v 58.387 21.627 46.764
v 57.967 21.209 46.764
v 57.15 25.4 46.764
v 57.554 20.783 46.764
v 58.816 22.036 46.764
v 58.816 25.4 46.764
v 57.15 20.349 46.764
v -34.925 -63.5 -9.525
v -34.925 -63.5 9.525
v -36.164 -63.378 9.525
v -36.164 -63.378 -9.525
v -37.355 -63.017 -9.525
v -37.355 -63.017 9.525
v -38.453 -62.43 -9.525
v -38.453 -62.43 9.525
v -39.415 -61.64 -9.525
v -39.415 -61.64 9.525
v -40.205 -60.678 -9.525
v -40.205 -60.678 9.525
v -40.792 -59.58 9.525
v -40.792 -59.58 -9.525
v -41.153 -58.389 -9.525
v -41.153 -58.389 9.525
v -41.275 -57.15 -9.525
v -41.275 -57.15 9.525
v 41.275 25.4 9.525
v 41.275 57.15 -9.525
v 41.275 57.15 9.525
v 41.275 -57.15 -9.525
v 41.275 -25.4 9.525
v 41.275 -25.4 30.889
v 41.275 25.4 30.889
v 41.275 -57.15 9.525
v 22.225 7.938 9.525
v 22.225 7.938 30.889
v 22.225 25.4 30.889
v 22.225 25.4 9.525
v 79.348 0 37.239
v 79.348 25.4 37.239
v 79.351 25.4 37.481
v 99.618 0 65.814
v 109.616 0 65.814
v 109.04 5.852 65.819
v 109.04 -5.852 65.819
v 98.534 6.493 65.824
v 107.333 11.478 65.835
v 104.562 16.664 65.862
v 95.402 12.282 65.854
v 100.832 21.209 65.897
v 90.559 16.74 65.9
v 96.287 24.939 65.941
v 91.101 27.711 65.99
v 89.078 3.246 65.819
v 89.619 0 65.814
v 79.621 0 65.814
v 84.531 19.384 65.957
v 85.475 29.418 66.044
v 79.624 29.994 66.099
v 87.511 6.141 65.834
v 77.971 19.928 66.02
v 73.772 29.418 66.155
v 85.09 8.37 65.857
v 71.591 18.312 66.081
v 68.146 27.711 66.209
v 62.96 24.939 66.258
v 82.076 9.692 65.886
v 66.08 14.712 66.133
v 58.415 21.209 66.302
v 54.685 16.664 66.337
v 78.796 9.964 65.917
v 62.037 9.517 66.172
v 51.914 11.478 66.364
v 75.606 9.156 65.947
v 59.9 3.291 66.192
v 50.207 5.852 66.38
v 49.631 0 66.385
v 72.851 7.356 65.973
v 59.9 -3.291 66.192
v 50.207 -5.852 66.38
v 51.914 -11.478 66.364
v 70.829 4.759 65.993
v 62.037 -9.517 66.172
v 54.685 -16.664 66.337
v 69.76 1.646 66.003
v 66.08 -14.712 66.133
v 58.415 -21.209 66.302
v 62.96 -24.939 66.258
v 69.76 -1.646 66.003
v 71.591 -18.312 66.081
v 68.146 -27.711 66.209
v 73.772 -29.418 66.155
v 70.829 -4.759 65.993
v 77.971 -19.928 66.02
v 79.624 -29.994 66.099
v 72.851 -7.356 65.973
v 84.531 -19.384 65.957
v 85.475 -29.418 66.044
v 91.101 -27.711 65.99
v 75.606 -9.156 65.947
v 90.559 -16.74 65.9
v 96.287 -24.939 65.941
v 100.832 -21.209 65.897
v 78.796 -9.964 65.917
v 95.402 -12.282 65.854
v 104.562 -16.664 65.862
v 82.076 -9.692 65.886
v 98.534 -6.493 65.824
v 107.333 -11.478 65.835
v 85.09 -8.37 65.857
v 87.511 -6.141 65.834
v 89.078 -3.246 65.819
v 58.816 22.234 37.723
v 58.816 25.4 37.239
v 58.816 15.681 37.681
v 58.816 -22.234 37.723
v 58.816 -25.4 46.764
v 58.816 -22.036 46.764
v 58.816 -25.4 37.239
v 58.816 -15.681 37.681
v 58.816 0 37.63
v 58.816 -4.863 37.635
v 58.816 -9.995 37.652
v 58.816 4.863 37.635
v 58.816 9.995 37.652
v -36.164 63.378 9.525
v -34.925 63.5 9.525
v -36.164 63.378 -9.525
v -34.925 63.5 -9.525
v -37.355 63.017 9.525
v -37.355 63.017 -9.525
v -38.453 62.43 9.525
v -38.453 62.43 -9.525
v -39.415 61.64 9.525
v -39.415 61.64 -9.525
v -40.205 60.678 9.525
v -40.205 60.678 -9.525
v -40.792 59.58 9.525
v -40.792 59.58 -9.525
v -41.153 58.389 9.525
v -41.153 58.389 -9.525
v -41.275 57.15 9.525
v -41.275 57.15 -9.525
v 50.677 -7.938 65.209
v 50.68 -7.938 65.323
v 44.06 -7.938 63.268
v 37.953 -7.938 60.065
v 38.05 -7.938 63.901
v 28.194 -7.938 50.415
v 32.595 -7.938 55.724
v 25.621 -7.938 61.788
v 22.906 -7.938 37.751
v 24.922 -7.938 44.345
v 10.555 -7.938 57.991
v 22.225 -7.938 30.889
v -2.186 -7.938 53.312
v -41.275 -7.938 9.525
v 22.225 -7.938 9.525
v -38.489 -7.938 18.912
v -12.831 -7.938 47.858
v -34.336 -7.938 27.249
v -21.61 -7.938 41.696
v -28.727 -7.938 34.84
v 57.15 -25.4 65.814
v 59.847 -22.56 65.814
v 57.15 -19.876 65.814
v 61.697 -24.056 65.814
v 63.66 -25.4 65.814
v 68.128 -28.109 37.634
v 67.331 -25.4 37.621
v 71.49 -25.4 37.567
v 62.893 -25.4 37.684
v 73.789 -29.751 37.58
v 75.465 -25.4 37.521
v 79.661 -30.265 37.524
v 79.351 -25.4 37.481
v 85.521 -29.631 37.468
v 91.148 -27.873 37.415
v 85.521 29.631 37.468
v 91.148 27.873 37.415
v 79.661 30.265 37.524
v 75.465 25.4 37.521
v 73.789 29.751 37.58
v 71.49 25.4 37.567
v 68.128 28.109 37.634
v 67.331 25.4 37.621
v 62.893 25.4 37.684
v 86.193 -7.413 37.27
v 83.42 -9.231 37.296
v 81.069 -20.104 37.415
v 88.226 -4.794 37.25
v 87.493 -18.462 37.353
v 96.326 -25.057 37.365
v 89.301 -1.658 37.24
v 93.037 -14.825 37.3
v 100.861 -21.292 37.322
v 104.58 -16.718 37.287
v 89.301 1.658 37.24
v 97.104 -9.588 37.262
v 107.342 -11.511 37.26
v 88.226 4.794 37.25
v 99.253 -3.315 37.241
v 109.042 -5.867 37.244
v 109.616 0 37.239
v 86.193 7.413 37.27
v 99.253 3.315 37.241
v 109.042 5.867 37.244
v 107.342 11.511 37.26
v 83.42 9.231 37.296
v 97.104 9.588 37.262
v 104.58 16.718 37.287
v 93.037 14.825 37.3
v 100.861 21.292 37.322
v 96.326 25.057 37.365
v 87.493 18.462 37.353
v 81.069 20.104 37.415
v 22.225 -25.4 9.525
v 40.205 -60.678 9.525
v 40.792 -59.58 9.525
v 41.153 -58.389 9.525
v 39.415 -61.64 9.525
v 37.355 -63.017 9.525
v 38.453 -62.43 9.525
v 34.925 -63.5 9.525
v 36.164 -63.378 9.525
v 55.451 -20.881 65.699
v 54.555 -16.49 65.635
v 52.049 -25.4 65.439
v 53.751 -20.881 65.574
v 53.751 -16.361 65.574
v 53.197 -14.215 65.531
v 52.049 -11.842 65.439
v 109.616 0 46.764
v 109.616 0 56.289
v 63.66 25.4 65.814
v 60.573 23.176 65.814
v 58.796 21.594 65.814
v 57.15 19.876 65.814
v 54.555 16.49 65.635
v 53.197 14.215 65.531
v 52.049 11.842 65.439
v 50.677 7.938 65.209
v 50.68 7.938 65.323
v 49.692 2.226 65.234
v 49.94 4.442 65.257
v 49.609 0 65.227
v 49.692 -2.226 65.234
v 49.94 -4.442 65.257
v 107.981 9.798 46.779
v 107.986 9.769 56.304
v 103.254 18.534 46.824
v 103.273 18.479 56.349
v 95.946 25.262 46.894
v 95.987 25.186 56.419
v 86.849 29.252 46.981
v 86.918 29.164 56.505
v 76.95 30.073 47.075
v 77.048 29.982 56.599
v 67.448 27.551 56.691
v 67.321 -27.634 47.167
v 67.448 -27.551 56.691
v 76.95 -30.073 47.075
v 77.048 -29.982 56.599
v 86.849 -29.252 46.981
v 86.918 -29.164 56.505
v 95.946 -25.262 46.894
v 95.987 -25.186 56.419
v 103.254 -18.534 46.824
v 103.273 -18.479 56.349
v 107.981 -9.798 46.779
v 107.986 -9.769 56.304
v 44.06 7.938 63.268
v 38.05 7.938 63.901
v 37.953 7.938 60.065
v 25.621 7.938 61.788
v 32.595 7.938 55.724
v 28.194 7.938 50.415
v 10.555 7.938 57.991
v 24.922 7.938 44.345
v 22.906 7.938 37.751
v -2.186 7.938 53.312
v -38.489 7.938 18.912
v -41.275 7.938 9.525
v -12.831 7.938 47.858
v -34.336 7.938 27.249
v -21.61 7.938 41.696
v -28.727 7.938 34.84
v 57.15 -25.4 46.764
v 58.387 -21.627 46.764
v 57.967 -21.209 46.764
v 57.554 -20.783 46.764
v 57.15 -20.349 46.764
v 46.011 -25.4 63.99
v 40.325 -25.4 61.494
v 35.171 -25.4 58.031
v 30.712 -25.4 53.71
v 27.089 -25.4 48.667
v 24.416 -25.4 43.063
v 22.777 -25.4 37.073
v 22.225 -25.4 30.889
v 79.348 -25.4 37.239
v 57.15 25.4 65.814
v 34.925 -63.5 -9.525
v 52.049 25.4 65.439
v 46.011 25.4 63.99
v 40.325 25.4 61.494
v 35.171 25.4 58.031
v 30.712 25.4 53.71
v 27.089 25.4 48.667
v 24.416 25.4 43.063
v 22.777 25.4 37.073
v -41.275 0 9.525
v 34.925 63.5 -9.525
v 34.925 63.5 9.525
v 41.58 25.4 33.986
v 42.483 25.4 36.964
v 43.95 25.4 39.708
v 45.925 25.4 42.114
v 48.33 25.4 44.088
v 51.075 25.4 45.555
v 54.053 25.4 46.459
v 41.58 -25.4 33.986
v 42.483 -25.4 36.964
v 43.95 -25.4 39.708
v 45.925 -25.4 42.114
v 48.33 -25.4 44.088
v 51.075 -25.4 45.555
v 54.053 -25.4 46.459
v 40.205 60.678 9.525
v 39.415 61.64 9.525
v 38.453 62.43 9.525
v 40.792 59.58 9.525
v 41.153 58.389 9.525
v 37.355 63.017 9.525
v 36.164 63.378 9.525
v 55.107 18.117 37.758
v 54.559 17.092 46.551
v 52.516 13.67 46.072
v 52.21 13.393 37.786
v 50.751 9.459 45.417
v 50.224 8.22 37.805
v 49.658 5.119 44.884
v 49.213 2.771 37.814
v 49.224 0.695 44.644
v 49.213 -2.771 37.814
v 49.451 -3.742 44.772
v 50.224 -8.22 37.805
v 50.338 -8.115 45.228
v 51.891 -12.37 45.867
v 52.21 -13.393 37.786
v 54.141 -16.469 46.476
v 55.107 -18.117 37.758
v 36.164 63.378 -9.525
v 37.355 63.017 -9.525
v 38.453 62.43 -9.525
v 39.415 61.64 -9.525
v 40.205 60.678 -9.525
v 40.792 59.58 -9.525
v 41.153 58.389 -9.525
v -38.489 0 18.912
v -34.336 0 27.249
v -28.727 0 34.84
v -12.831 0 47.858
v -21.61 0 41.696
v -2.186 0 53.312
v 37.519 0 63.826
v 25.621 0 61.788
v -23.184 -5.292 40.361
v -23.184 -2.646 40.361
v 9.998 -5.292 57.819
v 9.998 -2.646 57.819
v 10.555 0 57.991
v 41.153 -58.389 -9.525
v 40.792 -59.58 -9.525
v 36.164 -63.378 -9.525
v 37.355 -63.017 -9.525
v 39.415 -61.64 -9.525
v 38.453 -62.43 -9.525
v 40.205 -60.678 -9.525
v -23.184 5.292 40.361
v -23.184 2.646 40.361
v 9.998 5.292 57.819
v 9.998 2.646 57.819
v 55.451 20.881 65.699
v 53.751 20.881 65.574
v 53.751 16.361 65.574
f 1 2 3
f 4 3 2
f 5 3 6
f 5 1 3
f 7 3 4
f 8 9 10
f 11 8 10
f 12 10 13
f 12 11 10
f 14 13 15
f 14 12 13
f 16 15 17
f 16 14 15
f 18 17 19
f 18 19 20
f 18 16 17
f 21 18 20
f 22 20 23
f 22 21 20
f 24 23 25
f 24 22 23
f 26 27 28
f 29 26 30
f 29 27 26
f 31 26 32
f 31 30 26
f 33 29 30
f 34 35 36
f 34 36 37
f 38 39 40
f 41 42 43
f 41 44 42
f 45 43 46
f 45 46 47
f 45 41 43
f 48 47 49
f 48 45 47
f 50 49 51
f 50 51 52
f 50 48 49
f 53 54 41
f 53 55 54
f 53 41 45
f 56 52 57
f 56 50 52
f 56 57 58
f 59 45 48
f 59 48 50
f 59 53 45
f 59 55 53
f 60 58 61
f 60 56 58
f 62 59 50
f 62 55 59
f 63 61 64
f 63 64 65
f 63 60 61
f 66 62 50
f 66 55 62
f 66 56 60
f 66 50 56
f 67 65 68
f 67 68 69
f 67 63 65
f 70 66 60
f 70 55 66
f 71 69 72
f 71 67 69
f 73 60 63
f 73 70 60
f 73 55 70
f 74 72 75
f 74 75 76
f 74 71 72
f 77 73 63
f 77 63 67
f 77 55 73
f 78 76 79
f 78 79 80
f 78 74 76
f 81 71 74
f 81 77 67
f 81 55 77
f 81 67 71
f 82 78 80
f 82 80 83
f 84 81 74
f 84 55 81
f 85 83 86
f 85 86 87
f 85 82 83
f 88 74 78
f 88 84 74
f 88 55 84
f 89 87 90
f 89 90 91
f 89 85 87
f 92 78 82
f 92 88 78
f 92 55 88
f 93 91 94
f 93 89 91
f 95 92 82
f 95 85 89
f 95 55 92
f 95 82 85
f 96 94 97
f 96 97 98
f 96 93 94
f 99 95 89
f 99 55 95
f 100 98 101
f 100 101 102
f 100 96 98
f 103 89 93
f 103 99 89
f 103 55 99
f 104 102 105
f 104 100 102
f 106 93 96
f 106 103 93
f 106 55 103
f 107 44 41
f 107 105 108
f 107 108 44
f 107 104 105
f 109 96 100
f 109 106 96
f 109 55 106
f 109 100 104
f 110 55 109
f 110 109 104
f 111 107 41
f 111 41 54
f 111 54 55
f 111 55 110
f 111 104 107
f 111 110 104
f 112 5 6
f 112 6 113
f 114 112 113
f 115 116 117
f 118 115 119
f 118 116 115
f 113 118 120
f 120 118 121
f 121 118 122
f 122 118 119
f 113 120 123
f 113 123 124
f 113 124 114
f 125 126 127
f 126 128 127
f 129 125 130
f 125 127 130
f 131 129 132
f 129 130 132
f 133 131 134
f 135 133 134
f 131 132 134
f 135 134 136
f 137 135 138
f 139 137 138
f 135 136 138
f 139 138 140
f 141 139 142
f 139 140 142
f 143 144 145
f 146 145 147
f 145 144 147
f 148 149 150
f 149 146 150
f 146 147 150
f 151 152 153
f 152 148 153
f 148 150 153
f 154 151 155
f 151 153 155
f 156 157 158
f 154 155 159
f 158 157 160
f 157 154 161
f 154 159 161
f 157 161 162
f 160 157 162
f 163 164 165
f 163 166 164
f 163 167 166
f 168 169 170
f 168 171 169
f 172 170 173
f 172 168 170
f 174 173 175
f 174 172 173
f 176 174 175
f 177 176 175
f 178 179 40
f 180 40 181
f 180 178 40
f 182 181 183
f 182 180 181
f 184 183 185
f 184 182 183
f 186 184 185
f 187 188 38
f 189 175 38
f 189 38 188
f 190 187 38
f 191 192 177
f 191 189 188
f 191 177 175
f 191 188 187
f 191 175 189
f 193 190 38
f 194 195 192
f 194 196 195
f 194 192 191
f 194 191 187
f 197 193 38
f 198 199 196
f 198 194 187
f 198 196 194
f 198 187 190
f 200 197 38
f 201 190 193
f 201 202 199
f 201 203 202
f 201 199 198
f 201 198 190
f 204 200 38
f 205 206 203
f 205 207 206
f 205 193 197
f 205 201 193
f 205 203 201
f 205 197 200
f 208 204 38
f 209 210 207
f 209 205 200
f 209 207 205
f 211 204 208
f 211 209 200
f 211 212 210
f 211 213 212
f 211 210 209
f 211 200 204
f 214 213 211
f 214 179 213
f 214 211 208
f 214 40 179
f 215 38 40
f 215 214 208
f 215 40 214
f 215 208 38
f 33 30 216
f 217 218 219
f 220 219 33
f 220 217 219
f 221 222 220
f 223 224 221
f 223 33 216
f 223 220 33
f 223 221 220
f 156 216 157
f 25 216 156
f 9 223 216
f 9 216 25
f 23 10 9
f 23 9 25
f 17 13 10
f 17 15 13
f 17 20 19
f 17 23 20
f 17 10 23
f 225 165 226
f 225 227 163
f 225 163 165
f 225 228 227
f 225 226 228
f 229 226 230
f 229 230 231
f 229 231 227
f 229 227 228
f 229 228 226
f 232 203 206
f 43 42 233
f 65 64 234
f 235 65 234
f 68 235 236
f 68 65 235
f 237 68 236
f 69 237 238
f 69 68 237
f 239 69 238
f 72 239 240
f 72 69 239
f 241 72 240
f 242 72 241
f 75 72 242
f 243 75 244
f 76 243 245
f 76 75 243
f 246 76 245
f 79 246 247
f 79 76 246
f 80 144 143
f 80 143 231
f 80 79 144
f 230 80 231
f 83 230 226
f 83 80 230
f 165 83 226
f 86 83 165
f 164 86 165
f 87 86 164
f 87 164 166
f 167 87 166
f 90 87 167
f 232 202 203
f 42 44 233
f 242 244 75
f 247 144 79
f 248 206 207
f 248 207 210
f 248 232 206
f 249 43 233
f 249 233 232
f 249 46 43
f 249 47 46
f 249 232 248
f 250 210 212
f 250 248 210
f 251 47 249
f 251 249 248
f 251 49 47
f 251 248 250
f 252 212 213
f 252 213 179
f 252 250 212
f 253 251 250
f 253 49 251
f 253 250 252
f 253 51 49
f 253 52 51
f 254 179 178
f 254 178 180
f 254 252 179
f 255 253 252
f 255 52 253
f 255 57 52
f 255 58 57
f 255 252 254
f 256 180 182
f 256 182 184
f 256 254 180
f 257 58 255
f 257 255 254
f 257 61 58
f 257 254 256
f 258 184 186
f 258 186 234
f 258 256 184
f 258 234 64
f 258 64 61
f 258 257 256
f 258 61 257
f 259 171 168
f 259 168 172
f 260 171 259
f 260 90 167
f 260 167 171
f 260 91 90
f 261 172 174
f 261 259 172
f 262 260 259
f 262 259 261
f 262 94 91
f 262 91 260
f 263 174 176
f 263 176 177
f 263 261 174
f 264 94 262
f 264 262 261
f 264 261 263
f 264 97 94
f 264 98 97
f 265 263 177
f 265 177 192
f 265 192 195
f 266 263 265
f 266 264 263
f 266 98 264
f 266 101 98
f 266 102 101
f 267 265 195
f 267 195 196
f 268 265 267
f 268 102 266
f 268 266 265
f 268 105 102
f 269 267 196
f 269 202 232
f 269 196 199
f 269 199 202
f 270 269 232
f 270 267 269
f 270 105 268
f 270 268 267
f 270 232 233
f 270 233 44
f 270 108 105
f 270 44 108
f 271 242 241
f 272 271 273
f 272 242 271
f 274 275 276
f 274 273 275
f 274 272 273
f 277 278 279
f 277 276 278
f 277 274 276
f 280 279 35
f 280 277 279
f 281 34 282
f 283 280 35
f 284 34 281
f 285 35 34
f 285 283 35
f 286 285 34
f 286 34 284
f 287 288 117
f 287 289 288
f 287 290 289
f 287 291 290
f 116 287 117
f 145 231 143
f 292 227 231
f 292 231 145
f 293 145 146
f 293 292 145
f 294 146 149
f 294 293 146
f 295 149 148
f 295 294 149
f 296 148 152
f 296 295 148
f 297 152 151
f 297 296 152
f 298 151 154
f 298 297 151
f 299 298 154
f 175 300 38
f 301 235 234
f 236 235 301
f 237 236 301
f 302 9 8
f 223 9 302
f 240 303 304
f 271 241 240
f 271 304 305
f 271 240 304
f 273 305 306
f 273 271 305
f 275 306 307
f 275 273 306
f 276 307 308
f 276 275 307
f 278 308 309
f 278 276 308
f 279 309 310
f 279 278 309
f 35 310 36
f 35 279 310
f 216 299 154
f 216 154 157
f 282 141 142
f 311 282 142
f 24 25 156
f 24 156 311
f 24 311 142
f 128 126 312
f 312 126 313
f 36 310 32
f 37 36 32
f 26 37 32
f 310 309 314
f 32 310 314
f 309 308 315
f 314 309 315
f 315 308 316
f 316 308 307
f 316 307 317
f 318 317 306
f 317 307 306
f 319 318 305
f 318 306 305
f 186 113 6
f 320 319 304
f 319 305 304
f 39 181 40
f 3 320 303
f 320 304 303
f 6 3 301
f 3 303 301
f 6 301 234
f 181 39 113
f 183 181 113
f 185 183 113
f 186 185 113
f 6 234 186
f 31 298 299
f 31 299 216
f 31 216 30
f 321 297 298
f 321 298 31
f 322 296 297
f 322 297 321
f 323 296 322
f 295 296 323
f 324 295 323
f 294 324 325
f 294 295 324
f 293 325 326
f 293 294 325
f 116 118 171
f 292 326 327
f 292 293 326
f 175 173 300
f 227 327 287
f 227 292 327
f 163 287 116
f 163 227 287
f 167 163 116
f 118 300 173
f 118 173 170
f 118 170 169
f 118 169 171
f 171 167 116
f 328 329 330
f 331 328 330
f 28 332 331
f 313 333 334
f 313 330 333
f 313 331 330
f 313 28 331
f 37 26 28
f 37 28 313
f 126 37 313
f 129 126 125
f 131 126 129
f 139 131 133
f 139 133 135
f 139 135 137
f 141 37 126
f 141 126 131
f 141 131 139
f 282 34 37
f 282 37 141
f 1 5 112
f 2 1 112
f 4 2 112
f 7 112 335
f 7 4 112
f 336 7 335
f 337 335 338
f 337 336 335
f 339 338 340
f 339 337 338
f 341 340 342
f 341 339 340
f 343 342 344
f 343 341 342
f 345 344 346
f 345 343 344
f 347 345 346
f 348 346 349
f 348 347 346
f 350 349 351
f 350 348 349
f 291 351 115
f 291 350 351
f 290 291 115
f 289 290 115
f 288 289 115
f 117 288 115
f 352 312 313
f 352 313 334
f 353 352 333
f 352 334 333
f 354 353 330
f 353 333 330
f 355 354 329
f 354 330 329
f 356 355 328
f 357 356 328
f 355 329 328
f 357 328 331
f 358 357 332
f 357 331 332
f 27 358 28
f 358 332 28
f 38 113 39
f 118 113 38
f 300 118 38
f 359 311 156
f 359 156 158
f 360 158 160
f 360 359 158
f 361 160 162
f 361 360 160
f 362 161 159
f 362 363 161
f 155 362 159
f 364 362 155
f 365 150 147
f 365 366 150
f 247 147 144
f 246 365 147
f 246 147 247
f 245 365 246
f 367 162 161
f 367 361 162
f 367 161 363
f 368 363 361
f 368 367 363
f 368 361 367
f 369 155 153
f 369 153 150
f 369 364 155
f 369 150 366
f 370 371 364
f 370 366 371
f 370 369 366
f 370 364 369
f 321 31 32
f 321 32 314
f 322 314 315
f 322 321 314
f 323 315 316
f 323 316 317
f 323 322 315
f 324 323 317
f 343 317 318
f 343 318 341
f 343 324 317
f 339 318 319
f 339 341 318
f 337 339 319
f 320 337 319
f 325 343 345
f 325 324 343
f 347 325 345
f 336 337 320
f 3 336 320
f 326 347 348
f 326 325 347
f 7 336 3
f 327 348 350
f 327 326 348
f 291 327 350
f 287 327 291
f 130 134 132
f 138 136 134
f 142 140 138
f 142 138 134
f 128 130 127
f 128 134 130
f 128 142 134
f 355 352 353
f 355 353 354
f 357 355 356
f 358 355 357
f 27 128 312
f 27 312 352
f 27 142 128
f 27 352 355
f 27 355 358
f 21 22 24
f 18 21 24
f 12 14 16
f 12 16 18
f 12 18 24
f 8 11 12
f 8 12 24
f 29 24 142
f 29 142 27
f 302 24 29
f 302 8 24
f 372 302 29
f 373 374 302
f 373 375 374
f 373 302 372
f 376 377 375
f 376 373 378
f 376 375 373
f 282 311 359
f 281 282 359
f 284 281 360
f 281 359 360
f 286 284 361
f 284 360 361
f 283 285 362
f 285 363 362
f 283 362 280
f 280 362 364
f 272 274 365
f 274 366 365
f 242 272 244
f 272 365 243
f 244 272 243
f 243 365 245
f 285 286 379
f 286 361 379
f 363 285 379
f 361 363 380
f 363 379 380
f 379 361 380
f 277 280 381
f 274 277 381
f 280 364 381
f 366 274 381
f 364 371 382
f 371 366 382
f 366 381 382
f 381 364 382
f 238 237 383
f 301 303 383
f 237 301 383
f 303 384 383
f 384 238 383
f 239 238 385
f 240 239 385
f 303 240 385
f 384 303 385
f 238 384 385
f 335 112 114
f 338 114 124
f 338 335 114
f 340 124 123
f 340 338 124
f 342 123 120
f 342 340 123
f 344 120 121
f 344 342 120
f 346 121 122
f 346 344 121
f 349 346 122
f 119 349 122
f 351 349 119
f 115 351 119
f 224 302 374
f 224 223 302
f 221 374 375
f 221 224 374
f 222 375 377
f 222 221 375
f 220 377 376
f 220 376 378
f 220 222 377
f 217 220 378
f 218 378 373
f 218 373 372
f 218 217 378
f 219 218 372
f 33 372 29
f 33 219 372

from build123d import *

# Parameters (mm, degrees)
F1_DEPTH = 63.5
F2_DEPTH = 25.4
F3_DEPTH = 7.9375
F5_R     = 6.35


with BuildPart() as f1:
    # F0 (on Front) → F1 (new body, symmetric)
    with BuildSketch(Plane.XZ):
        Polygon((22.225, 9.525), (-41.275, 9.525), (-41.275, -9.525), (41.275, -9.525), (41.275, 9.525), align=None)
    extrude(amount=F1_DEPTH, both=True)

    # F0 (on Front) → F2 (join, symmetric)
    with BuildSketch(Plane.XZ):
        with BuildLine():
            Line((22.225, 30.8886063695), (22.225, 9.525))
            Line((22.225, 9.525), (41.275, 9.525))
            Line((41.275, 9.525), (41.275, 30.8886063695))
            ThreePointArc((41.275, 30.8886063695), (45.9246798487, 42.1139265208), (57.15, 46.7636063695))
            Line((57.15, 46.7636063695), (58.8163197305, 46.7636063695))
            Line((58.8163197305, 46.7636063695), (58.8163197305, 65.8136063695))
            Line((58.8163197305, 65.8136063695), (57.15, 65.8136063695))
            add(Edge.make_bspline(
                [(52.0489083349, 65.4390693016), (53.7508813718, 65.5794651146), (55.4520089295, 65.7039665401), (57.15, 65.8136063695)],
                knots=[109.0031117585, 109.0031117585, 109.0031117585, 109.0031117585, 113.3838076271, 113.3838076271, 113.3838076271, 113.3838076271], degree=3))
            ThreePointArc((52.0489083349, 65.4390693016), (30.7122310756, 53.7096492751), (22.225, 30.8886063695))
        make_face()
        Polygon((79.6208217113, 65.8136063695), (58.8163197305, 65.8136063695), (58.8163197305, 46.7636063695), (58.8163197305, 37.2386063695), (79.3484657375, 37.2386063695), align=None)
    extrude(amount=F2_DEPTH, both=True)

    # F0 (on Front) → F3 (join, symmetric)
    with BuildSketch(Plane.XZ):
        with BuildLine():
            add(Edge.make_bspline(
                [(-41.275, 9.525), (-33.1736003349, 48.6113302876), (9.6993906508, 61.9456561664), (52.0489083349, 65.4390693016)],
                knots=[0, 0, 0, 0, 109.0031117585, 109.0031117585, 109.0031117585, 109.0031117585], degree=3))
            Line((-41.275, 9.525), (22.225, 9.525))
            Line((22.225, 9.525), (22.225, 30.8886063695))
            ThreePointArc((22.225, 30.8886063695), (30.7122310756, 53.7096492751), (52.0489083349, 65.4390693016))
        make_face()
    extrude(amount=F3_DEPTH, both=True)

    # F0 (on Front) → F4 (revolve)
    with BuildSketch(Plane.XZ):
        Polygon((109.6163197305, 65.8136063695), (79.6208217113, 65.8136063695), (79.3484657375, 37.2386063695), (109.6163197305, 37.2386063695), align=None)
    revolve(axis=Axis((79.4846437244, 0, 51.5261063695), (0.0095308348, 0, 0.9999545806)))

    # F5
    f5_edges = [f1.edges().sort_by_distance(p)[0] for p in [
        (-41.275, -63.5, 0),
        (41.275, -63.5, 0),
        (41.275, 63.5, 0),
        (-41.275, 63.5, 0),
    ]]
    fillet(f5_edges, radius=F5_R)


solid = f1.part
